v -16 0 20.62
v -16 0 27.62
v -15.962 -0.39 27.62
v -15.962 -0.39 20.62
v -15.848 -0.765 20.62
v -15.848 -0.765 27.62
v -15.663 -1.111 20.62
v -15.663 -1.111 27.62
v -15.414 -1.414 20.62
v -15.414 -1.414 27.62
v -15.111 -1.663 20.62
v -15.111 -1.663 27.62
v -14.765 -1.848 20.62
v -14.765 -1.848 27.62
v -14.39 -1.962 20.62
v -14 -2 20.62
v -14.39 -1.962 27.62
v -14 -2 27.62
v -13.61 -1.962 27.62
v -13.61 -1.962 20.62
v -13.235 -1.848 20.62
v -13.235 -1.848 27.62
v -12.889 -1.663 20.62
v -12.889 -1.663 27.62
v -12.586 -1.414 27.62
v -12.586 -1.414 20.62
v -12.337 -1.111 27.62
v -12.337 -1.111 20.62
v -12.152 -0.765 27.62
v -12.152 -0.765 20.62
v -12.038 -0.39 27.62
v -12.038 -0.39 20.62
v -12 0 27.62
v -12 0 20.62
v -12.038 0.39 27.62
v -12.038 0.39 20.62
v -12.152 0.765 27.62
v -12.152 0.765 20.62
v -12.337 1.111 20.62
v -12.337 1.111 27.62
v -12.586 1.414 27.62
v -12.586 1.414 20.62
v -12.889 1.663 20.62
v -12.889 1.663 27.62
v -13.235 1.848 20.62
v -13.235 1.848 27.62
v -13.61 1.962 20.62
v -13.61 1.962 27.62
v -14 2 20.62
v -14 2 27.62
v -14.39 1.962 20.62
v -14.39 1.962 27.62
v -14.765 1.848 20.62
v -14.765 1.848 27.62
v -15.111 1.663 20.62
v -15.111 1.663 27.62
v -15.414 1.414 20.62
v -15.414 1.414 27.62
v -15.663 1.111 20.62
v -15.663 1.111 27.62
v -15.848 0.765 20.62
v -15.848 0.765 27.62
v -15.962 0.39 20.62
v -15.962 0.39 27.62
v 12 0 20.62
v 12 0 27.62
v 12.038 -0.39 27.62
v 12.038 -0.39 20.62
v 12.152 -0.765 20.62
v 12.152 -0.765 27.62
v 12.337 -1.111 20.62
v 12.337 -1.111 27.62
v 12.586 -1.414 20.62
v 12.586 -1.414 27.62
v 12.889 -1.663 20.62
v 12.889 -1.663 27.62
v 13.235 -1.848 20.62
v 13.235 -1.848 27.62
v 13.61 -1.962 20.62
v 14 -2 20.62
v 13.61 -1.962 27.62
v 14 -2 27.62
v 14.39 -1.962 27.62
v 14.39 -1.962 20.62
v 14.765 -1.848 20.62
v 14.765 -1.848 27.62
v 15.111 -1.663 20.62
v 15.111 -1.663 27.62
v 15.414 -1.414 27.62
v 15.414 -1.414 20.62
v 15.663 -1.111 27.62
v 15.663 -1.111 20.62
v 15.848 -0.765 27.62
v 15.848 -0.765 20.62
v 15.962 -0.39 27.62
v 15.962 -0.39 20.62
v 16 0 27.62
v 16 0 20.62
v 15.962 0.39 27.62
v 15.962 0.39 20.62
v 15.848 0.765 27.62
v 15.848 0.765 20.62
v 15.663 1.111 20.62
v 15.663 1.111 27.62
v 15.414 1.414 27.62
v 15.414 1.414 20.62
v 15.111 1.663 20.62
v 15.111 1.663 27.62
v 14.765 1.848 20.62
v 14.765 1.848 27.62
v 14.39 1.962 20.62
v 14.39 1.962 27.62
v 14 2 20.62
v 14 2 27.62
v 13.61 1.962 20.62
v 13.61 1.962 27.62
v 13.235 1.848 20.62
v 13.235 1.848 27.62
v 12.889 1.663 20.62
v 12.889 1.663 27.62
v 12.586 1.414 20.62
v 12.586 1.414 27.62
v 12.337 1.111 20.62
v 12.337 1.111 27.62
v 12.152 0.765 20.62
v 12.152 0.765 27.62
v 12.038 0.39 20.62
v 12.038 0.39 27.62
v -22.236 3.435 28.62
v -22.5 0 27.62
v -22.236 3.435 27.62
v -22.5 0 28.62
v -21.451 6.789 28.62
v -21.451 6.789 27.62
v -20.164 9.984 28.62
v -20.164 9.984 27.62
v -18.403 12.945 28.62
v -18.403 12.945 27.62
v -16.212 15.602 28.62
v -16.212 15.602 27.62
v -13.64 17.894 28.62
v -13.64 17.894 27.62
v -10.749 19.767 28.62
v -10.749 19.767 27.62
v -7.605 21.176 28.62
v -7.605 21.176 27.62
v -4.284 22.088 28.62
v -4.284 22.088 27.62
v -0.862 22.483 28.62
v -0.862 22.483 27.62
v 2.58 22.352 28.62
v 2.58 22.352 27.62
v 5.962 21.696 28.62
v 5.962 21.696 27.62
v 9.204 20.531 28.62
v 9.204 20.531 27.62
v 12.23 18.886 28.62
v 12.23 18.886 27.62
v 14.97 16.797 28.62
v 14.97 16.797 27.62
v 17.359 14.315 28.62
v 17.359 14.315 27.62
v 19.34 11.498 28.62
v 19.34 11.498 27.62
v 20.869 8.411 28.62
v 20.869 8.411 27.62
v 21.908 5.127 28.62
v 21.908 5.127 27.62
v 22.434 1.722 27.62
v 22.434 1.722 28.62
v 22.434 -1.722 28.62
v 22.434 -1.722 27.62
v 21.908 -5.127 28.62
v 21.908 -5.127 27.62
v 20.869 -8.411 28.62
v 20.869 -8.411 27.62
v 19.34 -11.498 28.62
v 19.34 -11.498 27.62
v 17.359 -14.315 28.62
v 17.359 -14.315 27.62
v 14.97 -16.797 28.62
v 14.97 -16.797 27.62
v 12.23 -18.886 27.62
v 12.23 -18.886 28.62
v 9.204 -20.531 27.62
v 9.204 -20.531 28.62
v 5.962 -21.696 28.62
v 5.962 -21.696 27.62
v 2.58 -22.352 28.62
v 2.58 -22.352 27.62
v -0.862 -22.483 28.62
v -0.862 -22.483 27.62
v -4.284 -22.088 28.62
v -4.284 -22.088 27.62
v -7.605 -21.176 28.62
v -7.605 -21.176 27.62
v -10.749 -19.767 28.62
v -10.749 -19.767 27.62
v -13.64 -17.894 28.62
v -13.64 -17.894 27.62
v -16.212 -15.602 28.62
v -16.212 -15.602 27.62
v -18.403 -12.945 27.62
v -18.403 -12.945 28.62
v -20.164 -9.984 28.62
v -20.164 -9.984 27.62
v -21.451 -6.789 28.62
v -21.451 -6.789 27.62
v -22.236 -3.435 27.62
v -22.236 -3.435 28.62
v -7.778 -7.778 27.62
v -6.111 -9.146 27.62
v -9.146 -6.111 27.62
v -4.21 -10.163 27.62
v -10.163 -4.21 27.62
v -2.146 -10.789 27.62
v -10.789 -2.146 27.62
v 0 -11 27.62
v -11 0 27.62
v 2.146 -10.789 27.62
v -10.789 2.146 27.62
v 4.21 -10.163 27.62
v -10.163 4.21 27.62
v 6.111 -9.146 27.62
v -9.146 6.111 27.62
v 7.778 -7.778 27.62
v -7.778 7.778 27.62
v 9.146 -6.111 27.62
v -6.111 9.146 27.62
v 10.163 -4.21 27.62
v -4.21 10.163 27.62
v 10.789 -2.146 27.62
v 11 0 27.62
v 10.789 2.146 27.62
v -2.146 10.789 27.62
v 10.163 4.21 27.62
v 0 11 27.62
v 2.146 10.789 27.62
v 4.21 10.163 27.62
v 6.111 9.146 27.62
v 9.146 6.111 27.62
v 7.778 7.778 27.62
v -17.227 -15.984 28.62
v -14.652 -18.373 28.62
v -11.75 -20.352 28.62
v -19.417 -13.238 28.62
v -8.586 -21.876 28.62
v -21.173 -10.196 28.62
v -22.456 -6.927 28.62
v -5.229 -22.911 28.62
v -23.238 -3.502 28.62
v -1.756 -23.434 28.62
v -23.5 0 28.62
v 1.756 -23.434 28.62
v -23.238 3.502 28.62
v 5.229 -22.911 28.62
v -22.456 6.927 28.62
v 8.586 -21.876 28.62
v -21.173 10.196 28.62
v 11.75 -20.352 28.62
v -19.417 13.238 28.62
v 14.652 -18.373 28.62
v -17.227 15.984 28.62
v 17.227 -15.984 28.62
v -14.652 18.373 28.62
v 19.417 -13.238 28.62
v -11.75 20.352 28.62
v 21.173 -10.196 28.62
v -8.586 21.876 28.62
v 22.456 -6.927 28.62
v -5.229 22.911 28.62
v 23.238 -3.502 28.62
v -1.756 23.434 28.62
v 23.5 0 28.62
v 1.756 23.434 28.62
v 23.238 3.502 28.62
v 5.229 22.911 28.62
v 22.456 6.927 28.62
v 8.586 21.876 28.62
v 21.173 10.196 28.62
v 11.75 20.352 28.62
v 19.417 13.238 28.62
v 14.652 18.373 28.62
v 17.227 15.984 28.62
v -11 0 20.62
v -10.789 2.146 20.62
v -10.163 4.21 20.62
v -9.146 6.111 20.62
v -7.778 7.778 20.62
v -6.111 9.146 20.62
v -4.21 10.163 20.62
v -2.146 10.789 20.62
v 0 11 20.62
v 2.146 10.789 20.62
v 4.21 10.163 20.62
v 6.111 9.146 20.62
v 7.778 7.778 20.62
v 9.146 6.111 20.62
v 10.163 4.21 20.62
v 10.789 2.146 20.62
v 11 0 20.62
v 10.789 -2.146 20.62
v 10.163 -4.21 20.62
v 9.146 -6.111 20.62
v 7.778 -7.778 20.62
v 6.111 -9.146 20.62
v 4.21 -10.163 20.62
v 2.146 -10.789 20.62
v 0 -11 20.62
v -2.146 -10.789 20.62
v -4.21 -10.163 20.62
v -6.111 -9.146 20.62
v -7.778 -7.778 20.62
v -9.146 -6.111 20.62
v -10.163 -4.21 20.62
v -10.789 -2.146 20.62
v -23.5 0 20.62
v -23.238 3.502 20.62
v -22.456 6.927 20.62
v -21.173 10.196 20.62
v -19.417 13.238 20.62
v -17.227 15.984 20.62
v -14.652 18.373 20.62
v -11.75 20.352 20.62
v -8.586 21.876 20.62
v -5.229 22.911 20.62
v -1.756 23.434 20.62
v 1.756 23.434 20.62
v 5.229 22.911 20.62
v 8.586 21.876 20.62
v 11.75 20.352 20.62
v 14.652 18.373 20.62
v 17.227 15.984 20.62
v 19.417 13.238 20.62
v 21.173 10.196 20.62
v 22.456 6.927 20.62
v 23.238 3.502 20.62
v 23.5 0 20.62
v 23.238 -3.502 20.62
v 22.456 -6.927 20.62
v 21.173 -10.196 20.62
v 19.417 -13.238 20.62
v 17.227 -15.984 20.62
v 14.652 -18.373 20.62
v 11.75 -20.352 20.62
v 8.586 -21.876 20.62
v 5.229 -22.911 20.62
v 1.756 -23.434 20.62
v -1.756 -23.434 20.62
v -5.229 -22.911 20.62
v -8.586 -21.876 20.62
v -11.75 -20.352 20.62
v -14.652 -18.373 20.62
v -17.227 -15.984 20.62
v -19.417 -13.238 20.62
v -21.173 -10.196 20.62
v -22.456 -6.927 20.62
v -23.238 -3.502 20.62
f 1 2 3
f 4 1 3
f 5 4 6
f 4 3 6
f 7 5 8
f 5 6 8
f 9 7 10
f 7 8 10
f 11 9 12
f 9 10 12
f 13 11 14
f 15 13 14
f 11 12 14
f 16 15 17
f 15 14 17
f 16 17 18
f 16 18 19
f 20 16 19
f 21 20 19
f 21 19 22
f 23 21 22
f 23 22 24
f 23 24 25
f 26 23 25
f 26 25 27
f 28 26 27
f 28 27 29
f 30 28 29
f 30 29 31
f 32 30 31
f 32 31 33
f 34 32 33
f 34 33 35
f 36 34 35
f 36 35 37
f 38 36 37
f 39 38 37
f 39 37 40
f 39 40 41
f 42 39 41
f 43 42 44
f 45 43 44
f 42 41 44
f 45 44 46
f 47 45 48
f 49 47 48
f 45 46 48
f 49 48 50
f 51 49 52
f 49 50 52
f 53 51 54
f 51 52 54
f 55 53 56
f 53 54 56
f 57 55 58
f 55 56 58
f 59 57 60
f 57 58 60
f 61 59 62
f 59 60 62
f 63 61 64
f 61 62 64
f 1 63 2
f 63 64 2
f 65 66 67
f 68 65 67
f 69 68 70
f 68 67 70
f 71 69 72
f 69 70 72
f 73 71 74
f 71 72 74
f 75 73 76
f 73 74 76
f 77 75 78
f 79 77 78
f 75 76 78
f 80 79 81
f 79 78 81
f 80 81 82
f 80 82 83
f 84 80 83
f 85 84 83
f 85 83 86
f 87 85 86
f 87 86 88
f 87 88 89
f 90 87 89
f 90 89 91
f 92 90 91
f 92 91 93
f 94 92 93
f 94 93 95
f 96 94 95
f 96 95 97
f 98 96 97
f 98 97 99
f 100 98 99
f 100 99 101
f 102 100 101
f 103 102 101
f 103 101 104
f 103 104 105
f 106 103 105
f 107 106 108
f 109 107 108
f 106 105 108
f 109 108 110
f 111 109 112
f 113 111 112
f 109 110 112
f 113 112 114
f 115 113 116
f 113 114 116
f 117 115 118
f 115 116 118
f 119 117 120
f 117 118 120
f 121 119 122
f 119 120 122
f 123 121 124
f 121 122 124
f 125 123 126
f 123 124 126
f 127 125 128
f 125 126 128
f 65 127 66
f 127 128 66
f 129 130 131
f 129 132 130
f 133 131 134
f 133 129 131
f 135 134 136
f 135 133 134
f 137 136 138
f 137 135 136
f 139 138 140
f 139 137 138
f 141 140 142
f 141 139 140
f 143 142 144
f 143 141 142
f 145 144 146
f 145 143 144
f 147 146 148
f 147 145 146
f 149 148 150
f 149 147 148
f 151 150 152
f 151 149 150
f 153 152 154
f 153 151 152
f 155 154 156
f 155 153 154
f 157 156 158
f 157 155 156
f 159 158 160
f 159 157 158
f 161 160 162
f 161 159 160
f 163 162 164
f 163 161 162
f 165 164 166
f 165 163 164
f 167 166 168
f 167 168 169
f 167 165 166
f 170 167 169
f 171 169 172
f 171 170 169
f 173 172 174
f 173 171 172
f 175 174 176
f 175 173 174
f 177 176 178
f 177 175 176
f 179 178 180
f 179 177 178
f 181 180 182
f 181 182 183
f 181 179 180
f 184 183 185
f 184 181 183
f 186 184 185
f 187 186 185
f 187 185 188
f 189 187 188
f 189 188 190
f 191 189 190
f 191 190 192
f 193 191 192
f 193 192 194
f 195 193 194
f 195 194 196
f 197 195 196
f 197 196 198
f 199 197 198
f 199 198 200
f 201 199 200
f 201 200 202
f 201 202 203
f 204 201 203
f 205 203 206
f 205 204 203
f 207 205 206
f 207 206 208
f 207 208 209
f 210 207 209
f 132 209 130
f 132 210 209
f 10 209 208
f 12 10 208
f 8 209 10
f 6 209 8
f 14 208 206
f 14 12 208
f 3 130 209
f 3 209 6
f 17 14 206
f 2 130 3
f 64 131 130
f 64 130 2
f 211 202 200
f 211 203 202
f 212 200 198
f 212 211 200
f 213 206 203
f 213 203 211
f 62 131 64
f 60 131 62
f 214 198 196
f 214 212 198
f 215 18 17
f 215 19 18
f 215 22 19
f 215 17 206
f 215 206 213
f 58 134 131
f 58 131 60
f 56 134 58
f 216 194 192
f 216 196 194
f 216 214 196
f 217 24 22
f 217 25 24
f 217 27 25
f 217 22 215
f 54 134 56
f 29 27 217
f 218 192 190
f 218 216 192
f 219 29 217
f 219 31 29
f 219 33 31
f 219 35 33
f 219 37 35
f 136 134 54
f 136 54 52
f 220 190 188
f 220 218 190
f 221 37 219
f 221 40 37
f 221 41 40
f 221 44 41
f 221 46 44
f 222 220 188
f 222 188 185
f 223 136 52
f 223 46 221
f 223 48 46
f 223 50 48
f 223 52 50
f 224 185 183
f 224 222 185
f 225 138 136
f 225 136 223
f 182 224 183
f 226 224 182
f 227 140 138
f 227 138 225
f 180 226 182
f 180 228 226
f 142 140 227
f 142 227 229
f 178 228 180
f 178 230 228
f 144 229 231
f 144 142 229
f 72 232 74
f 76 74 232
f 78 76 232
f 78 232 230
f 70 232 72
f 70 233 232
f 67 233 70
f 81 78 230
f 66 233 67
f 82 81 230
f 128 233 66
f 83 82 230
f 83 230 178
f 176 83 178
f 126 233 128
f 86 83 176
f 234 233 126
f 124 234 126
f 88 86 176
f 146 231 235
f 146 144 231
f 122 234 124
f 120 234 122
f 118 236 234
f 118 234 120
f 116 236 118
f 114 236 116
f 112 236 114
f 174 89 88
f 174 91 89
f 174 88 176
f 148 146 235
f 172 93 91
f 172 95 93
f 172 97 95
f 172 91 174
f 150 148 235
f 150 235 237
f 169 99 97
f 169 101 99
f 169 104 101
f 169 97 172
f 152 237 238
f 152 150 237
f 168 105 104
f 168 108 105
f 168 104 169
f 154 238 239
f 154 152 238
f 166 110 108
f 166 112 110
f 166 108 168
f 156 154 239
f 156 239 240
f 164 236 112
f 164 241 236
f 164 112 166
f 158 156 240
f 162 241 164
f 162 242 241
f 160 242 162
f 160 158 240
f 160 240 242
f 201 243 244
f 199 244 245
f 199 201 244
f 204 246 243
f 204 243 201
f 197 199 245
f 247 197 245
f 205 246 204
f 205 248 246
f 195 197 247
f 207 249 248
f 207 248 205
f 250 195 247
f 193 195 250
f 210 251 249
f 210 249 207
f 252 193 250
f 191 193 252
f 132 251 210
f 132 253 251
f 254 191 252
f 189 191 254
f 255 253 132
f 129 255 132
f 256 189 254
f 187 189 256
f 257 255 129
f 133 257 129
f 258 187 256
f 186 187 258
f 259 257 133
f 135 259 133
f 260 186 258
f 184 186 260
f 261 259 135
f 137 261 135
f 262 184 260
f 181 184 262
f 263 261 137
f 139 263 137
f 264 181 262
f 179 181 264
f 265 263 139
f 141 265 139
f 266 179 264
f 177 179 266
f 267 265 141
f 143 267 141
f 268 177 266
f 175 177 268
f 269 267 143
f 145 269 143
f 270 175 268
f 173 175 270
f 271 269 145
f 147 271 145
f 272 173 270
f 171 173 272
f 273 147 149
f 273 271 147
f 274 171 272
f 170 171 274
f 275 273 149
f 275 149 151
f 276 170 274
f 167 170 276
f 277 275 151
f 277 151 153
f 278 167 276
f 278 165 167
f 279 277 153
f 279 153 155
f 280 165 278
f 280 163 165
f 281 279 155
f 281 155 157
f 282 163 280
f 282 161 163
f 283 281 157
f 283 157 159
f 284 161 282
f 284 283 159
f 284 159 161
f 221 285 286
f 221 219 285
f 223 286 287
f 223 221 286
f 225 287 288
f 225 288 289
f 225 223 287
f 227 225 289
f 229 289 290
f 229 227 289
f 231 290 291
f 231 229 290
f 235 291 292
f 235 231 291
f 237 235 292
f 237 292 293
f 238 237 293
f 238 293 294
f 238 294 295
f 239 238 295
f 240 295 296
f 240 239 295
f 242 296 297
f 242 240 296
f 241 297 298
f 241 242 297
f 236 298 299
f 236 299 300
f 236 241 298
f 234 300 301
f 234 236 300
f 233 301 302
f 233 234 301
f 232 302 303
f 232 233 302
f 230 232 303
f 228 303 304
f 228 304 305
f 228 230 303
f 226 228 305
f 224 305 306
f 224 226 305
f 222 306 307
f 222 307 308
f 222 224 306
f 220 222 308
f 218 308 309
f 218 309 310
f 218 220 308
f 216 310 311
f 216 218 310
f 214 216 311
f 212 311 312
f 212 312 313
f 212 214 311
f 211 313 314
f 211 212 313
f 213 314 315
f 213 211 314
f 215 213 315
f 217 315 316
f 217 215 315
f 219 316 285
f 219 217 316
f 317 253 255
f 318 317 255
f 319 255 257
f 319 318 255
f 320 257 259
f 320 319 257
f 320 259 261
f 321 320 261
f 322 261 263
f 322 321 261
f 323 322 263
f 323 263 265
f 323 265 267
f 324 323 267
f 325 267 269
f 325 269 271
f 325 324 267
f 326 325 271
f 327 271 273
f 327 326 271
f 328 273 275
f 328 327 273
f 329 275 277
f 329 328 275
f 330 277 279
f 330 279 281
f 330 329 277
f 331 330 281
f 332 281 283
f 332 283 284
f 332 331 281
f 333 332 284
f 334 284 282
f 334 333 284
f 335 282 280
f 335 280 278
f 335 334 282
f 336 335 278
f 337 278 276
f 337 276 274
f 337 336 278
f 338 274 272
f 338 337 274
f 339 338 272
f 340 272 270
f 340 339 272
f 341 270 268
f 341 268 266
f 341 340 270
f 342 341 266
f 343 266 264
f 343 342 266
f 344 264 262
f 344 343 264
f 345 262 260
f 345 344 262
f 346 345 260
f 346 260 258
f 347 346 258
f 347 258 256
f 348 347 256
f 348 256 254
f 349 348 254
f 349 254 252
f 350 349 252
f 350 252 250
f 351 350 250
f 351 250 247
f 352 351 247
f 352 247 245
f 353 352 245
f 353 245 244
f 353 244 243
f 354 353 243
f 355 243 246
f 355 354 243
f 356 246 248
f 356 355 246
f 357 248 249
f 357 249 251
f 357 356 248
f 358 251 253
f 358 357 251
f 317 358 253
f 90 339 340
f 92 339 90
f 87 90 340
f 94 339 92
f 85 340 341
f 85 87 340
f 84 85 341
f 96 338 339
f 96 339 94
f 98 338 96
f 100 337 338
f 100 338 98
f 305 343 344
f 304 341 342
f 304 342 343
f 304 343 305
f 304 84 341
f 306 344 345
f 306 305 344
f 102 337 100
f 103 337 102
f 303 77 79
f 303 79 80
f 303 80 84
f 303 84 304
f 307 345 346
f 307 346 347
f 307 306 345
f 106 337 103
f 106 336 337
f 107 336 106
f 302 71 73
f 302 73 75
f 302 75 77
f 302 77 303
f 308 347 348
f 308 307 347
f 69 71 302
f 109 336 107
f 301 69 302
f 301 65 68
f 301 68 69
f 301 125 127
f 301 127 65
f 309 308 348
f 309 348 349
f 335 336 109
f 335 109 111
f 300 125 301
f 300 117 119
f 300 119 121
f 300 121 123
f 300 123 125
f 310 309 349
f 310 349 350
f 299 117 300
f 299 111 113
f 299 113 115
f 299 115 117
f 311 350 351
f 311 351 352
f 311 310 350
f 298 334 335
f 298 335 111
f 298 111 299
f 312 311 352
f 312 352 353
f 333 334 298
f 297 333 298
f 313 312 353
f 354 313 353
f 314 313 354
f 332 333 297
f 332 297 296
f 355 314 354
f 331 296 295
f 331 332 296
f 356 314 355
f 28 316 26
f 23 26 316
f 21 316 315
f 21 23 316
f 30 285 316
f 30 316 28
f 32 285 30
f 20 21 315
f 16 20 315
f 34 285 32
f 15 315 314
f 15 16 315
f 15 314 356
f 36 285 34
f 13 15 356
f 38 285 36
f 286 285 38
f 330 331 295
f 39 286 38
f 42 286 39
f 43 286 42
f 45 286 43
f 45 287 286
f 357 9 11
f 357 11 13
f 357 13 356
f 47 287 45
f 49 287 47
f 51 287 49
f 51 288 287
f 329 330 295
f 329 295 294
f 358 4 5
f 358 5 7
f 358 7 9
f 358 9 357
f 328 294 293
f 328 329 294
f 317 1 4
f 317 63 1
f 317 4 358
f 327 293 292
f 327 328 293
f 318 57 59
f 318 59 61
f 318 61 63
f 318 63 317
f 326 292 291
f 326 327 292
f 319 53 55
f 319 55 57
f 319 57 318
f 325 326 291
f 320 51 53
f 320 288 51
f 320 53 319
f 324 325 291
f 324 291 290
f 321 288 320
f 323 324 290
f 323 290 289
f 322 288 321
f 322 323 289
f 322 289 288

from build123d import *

# Parameters (mm, degrees)
F3_D = 4


with BuildPart() as f1:
    # F0 (on Front) → F1 (revolve)
    with BuildSketch(Plane.XZ):
        Polygon((-23.5, 20.620037), (-11, 20.620037), (-11, 27.620037), (-22.5, 27.620037), (-22.5, 28.620037), (-23.5, 28.620037), align=None)
    revolve(axis=Axis((0, 0, 24.120037), (0, 0, -1)))

    # F3 (through all)
    with Locations(Plane(origin=(0, 0, 20.620037), x_dir=(1, 0, 0), z_dir=(0, 0, -1))):
        with Locations((-14, 0), (14, 0)):
            Hole(F3_D / 2)


solid = f1.part
